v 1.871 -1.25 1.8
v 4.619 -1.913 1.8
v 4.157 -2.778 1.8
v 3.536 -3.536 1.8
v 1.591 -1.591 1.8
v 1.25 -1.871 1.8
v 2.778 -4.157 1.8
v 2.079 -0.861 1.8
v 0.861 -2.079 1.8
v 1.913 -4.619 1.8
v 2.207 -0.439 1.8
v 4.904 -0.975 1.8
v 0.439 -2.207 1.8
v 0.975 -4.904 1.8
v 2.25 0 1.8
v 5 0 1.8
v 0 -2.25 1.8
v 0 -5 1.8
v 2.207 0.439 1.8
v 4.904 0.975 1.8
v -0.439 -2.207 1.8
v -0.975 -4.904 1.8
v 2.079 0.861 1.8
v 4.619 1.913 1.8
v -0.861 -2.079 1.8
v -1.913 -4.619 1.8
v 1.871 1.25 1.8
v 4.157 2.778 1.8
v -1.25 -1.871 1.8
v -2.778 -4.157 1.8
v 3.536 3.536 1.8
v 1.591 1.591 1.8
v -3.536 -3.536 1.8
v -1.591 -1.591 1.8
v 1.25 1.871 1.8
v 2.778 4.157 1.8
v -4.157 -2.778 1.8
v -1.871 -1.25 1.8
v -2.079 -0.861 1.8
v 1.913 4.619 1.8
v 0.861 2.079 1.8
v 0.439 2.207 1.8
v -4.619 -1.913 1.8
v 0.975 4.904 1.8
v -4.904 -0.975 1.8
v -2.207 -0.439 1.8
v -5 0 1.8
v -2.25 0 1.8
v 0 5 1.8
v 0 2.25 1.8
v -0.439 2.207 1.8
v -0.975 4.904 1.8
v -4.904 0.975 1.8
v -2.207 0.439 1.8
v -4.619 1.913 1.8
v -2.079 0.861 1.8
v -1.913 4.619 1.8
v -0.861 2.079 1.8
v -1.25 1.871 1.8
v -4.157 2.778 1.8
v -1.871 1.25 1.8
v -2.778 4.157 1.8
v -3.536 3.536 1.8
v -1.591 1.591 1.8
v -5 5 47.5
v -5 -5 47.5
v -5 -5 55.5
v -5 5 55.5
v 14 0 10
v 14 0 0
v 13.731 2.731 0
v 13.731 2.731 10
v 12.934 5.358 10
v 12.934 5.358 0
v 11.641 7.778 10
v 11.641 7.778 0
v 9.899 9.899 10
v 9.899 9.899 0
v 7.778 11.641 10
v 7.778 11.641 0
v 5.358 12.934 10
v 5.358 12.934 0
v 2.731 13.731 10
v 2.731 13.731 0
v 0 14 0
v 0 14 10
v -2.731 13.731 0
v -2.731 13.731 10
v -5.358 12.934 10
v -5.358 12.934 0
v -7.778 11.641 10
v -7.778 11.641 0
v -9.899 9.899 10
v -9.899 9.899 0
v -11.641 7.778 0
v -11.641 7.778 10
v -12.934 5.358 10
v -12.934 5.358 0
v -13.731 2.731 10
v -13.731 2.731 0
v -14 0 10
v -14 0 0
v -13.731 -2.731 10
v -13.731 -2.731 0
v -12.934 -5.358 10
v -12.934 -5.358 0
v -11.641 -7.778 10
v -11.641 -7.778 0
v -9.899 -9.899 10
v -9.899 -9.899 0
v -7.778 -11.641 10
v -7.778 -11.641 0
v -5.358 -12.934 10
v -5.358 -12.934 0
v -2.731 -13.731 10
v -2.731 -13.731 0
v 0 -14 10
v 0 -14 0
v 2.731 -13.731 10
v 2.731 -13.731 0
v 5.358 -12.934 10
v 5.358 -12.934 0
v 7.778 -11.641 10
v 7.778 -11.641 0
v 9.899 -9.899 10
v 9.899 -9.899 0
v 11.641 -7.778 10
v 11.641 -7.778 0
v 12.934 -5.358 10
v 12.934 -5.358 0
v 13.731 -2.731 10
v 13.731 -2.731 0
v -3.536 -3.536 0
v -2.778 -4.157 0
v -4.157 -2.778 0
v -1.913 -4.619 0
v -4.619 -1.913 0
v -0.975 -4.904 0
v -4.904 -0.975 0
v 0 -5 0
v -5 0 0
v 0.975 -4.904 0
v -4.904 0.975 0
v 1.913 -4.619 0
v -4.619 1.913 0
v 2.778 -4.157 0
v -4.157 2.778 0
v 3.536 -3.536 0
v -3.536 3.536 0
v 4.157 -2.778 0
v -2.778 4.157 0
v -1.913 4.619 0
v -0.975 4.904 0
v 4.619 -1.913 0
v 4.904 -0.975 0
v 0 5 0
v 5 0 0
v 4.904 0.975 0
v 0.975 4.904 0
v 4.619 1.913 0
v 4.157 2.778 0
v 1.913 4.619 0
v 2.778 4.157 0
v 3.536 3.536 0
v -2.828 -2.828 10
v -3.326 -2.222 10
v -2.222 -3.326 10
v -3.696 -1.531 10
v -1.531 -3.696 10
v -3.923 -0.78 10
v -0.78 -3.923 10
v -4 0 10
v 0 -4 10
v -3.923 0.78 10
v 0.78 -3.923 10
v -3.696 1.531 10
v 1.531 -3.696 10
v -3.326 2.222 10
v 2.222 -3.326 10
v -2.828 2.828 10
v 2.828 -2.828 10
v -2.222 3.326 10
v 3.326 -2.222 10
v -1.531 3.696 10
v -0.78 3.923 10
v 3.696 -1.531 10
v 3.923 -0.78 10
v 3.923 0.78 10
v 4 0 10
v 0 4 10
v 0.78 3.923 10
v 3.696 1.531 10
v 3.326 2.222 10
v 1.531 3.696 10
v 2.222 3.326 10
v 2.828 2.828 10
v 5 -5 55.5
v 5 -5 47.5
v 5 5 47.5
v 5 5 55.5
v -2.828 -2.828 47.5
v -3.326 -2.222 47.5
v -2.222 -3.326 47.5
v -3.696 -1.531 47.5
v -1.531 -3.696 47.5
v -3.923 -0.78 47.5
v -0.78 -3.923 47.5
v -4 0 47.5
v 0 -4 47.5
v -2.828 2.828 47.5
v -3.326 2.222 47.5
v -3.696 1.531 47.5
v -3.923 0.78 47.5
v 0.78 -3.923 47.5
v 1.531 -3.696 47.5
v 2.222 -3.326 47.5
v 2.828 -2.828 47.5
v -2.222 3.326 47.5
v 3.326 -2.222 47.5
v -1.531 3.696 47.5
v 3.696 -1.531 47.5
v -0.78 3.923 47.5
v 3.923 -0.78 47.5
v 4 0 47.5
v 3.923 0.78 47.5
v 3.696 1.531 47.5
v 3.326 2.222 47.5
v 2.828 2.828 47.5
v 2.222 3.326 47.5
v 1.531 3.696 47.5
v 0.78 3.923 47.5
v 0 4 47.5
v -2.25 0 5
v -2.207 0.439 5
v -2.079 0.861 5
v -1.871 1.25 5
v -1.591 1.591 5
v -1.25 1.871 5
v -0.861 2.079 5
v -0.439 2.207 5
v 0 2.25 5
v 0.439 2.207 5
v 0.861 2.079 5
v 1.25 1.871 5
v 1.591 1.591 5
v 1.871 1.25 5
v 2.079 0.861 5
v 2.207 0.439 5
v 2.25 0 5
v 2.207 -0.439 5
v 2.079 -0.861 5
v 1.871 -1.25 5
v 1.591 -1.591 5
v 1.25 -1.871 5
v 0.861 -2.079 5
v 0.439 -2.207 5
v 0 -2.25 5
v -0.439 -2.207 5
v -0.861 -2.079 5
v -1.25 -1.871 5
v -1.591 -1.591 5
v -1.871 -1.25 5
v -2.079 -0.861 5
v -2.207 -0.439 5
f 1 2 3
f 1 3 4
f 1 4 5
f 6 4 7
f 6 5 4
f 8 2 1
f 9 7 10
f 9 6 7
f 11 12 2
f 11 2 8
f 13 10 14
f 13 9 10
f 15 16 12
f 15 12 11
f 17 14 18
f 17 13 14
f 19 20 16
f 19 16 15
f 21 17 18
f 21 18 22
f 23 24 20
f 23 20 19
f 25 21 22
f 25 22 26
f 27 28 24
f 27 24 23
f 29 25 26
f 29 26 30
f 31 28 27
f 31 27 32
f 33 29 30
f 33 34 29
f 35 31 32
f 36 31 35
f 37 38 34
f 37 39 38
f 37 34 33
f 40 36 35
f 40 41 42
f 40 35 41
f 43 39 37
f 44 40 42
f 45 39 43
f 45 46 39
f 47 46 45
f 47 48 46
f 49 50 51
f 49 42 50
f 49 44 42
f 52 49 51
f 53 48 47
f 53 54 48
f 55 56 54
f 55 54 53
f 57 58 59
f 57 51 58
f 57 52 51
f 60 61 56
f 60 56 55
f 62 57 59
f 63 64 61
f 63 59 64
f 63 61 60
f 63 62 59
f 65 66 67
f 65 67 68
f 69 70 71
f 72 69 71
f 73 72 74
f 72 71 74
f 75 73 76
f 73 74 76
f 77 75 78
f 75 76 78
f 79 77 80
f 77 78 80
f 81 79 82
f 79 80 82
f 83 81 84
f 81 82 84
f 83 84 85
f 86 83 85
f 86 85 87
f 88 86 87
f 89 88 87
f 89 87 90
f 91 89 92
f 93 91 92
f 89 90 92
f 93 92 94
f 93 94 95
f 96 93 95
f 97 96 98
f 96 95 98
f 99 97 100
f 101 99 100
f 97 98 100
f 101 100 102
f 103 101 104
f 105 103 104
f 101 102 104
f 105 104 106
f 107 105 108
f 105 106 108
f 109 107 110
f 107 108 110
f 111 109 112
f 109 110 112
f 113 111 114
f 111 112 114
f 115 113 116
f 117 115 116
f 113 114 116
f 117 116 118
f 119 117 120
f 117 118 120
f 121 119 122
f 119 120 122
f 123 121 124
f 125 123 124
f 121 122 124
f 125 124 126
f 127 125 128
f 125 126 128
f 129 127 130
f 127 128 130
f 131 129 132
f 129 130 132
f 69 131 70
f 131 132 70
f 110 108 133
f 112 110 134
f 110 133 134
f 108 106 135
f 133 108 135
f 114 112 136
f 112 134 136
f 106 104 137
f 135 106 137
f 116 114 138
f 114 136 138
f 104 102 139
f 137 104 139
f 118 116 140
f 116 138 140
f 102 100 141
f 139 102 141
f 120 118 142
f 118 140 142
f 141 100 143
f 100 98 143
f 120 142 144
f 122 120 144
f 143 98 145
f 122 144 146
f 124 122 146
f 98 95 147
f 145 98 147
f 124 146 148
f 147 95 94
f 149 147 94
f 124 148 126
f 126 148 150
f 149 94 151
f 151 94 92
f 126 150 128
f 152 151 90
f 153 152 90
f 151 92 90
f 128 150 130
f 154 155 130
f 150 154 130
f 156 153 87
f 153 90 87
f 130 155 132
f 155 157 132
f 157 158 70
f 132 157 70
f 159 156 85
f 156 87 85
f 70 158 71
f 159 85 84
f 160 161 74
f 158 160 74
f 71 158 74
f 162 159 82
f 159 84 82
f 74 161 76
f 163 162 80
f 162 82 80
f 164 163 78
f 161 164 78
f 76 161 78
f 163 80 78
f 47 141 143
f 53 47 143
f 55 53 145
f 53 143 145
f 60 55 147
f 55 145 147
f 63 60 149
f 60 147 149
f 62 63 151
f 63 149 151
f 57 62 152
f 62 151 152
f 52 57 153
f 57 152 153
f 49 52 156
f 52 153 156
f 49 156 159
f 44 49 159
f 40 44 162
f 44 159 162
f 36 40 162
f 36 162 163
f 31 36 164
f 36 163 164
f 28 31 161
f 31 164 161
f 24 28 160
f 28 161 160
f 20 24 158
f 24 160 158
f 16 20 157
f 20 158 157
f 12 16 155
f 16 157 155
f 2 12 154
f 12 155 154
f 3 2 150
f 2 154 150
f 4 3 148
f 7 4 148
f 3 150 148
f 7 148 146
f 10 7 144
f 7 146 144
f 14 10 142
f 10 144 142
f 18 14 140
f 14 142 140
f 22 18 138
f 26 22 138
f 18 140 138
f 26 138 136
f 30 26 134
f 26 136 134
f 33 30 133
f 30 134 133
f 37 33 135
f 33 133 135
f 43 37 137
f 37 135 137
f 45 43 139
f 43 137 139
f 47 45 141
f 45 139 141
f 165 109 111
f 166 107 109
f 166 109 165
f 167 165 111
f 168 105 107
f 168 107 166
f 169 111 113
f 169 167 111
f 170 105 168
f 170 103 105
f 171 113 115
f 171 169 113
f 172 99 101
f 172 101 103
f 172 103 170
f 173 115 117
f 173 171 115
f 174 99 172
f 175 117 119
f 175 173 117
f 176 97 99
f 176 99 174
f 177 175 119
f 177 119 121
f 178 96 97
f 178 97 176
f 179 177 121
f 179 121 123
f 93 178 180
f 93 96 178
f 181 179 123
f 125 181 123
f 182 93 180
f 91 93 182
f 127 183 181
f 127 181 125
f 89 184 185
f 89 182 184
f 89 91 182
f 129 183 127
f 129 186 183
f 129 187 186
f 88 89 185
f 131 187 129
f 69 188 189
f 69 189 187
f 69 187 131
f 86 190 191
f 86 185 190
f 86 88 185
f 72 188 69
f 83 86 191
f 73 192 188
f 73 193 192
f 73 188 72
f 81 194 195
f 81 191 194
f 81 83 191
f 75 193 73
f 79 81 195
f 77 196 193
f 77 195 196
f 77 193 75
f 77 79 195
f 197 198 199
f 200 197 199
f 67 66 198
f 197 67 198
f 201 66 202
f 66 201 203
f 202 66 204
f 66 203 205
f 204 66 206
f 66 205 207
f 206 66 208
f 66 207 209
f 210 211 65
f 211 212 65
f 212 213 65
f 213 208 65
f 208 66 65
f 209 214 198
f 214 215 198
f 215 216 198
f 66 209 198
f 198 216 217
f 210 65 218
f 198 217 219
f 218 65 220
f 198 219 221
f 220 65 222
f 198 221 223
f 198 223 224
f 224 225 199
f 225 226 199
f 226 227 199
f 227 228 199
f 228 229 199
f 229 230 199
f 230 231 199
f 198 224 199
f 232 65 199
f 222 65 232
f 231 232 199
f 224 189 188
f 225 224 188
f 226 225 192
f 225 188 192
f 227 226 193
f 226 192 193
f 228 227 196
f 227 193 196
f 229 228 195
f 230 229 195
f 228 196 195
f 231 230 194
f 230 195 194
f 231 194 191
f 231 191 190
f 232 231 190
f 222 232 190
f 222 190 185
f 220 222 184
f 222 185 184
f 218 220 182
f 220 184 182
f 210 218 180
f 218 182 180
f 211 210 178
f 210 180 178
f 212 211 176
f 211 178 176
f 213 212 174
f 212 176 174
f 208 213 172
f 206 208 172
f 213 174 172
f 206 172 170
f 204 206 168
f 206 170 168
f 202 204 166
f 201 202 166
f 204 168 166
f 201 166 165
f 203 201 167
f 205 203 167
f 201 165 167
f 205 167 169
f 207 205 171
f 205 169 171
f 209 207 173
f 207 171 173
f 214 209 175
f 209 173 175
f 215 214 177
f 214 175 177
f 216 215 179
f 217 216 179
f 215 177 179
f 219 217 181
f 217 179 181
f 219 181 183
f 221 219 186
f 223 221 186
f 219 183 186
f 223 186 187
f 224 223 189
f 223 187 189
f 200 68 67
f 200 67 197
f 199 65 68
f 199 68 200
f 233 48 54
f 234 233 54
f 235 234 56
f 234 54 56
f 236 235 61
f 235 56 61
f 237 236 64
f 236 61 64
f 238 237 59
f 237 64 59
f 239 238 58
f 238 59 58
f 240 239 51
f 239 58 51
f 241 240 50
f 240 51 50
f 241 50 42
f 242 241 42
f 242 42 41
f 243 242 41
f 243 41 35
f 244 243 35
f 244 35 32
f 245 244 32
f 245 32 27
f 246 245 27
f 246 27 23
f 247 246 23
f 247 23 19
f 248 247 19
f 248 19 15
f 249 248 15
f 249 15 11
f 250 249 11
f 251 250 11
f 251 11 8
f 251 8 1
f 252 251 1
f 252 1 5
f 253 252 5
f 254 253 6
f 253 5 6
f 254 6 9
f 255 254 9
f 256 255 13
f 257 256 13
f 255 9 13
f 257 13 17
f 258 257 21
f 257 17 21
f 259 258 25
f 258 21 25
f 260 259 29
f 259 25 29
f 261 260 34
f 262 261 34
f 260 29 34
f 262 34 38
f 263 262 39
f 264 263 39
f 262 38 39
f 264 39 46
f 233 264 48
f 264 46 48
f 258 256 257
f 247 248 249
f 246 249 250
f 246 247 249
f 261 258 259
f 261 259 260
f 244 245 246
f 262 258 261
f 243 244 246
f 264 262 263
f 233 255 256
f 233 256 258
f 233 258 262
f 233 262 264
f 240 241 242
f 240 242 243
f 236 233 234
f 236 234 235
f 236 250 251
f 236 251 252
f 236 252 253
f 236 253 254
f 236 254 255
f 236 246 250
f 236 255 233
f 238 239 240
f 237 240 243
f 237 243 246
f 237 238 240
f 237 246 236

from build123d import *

# Parameters (mm, degrees)
SKETCH1_R           = 14
BOSS_EXTRUDE1_DEPTH = 10
SKETCH2_R           = 2.25
CUT_EXTRUDE1_DEPTH  = 5
SKETCH3_R           = 5
CUT_EXTRUDE2_DEPTH  = 1.8
SKETCH11_R          = 4
BOSS_EXTRUDE2_DEPTH = 37.5
SKETCH12_W          = 10
SKETCH12_H          = 10
BOSS_EXTRUDE3_DEPTH = 8


with BuildPart() as part:
    # Sketch1 → Boss-Extrude1 (new body)
    with BuildSketch(Plane.XY):
        Circle(SKETCH1_R)
    extrude(amount=BOSS_EXTRUDE1_DEPTH)

    # Sketch2 → Cut-Extrude1 (cut)
    with BuildSketch(Plane(origin=(0, 0, 0), x_dir=(-1, 0, 0), z_dir=(0, 0, -1))):
        Circle(SKETCH2_R)
    extrude(amount=-CUT_EXTRUDE1_DEPTH, mode=Mode.SUBTRACT)

    # Sketch3 → Cut-Extrude2 (cut)
    with BuildSketch(Plane(origin=(0, 0, 0), x_dir=(-1, 0, 0), z_dir=(0, 0, -1))):
        Circle(SKETCH3_R)
    extrude(amount=-CUT_EXTRUDE2_DEPTH, mode=Mode.SUBTRACT)

    # Sketch11 → Boss-Extrude2 (add)
    with BuildSketch(Plane.XY.offset(10)):
        Circle(SKETCH11_R)
    extrude(amount=BOSS_EXTRUDE2_DEPTH)

    # Sketch12 → Boss-Extrude3 (add)
    with BuildSketch(Plane.XY.offset(47.5)):
        Rectangle(SKETCH12_W, SKETCH12_H)
    extrude(amount=BOSS_EXTRUDE3_DEPTH)


solid = part.part
